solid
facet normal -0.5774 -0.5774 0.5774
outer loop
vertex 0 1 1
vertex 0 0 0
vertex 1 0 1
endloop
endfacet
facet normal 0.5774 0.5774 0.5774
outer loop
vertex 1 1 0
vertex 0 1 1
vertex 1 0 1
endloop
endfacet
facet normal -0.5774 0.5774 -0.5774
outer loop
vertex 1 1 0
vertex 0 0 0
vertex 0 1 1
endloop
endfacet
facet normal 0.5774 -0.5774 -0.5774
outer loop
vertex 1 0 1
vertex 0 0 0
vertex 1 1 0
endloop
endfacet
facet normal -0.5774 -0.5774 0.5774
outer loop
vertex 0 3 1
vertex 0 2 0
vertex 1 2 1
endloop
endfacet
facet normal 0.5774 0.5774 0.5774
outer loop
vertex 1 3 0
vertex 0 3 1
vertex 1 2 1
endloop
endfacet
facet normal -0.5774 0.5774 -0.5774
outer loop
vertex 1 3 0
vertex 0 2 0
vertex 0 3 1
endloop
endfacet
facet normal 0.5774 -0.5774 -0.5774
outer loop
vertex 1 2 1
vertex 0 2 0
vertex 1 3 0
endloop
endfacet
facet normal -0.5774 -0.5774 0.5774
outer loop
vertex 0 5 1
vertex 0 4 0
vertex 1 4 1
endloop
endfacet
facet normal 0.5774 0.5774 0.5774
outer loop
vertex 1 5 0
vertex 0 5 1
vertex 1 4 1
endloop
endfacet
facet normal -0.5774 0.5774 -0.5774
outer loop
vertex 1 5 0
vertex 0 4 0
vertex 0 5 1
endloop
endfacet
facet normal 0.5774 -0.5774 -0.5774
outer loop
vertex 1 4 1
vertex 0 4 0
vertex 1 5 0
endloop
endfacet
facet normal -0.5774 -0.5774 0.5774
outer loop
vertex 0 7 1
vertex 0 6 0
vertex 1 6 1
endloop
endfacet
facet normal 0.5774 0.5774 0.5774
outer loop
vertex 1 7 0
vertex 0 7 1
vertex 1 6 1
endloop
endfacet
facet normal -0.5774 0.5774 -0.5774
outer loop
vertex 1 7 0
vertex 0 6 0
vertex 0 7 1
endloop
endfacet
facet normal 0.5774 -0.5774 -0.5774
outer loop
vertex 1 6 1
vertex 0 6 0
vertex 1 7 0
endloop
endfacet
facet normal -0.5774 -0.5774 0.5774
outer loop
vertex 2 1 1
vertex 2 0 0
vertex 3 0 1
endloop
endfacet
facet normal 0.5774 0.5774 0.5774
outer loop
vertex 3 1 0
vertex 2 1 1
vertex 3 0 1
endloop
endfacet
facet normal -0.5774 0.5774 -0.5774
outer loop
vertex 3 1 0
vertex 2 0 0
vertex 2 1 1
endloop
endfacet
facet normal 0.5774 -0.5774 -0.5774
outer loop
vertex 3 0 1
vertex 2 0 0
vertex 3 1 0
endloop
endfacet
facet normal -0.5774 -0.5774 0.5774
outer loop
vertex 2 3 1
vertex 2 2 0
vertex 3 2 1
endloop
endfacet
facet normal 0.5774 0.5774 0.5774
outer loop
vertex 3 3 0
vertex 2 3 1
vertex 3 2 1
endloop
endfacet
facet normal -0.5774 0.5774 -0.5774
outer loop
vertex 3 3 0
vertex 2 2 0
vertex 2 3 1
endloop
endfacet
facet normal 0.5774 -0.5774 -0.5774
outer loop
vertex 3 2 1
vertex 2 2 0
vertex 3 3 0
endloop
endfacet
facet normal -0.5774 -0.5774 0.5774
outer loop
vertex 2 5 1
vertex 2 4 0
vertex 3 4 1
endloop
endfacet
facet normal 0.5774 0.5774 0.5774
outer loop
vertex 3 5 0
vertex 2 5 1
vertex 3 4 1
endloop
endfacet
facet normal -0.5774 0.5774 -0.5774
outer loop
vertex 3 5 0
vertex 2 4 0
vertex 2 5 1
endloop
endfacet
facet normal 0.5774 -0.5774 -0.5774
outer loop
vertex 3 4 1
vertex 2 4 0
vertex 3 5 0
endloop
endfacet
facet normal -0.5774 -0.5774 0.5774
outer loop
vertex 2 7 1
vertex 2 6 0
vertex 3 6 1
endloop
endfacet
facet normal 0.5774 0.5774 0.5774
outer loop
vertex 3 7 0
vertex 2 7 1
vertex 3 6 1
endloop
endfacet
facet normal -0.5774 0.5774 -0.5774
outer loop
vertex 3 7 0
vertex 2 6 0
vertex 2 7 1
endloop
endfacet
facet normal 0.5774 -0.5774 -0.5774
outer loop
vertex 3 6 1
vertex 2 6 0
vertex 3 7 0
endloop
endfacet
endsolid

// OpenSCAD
// file: common.scad
module layout(rows=1, scale=2) {
    for (child = [0:$children-1]) {
        x = floor(child / rows);
        y = child % rows;
        translate([x*scale, y*scale, 0]) children(child);
    }
}

// Avoid non-triangular faces (i.e. squares on a cube).
// Those can be triangulated in multiple ways, which makes
// comparison against a reference object harder.
module tetra() {
    polyhedron(
        [[0, 0, 0], [0, 1, 1], [1, 0, 1], [1, 1, 0]],
        [[0, 1, 2], [0, 2, 3], [0, 3, 1], [1, 3, 2]]
    );
}

tetra();
// main file
use <common.scad>

// Verify that all forms of color/alpha specification work.

layout(rows=4) {
    color("red") tetra();
    color("red", 0.75) tetra();
    color(alpha=0.5, "red") tetra();
    color(alpha=0.25, c="red") tetra();

    color([0, 1, 0]) tetra();
    color([0, 1, 0], 0.75) tetra();
    color([0, 1, 0, 0.5]) tetra();
    color([0, 1, 0, 0.5], alpha=0.25) tetra();

    /* These ones don't work in 2015.03, they can be added when support is dropped.
    color("#0000ff") tetra();
    color("#00f", 0.75) tetra();
    color("#0000ff80") tetra();
    color("#00f8", 0.25) tetra();
    */
}
